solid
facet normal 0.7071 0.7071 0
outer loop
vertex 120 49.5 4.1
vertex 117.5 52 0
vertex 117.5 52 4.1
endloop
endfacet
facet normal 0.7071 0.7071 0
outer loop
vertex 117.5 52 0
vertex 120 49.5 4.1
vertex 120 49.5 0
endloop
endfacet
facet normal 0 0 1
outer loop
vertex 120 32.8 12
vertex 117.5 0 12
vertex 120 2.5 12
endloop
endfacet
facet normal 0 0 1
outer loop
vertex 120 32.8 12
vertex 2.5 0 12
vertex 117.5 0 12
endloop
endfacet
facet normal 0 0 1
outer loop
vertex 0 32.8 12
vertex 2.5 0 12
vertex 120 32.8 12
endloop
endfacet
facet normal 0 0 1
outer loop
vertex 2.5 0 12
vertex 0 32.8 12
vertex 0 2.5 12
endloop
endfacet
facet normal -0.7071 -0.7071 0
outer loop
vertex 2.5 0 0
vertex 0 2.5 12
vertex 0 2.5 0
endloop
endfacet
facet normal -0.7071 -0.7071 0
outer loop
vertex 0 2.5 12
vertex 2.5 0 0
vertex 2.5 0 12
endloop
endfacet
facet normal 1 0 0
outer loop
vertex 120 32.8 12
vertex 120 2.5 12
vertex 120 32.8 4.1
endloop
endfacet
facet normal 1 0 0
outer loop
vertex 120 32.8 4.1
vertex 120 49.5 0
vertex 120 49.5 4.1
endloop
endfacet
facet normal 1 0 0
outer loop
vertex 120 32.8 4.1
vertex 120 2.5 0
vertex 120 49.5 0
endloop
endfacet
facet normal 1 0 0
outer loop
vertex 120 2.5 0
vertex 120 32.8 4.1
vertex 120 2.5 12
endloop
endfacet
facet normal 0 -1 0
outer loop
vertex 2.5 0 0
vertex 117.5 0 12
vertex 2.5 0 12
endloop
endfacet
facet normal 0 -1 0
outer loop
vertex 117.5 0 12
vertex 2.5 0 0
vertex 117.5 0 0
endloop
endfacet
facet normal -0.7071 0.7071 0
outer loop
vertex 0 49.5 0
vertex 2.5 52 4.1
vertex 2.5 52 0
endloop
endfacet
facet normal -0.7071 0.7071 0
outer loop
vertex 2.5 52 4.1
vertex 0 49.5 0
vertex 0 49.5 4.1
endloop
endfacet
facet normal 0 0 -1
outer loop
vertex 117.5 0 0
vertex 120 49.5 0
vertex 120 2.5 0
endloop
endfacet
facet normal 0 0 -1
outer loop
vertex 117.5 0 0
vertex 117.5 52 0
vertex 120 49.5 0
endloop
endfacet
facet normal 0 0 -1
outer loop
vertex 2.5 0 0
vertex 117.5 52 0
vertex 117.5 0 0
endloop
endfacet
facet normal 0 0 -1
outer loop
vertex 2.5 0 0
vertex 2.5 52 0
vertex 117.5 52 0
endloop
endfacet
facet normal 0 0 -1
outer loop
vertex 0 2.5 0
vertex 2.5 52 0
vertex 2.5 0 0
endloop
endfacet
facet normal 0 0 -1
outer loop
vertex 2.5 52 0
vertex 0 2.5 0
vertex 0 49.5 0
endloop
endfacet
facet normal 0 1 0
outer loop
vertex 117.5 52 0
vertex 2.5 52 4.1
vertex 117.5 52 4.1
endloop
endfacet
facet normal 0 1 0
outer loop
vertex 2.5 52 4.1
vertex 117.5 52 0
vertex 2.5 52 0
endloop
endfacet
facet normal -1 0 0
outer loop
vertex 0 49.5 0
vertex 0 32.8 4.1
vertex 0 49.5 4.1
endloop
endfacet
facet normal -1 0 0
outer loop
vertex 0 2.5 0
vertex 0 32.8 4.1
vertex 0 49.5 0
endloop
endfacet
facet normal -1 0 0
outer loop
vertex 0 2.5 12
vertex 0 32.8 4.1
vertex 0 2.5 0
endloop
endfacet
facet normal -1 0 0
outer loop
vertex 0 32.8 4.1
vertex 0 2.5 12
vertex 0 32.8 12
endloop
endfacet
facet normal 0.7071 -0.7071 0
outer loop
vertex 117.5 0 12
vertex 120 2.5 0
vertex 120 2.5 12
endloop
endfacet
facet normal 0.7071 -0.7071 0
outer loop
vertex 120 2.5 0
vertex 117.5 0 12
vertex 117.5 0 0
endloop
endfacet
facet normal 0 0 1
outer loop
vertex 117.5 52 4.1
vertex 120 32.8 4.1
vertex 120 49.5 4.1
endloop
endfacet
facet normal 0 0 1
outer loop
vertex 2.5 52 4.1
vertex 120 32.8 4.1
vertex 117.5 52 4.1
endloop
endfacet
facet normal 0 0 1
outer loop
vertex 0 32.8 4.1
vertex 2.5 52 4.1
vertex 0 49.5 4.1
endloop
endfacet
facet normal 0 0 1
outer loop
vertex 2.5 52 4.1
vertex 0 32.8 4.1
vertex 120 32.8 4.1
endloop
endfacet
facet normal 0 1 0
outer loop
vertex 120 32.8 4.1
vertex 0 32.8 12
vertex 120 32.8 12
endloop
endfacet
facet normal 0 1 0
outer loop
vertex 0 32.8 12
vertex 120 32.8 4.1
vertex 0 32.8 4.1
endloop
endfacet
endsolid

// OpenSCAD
$fn = 32;

// ----------------------------------------------------------------------
// Stepped bar: sidestep, 120 x 52 x 12/4.1 mm
// ----------------------------------------------------------------------

// --- parameters (mm) ---
bar_l = 120;              // bar length, X
bar_w = 52;               // bar width, Y
plate_t = 12;             // thickness of the thick zone, Z
thin_t = 4.1;             // thickness of the thin zone
corner_c = 2.5;           // corner chamfer of the bar
step_cut = 7.9;           // material removed from the thin zone
ledge_y = 32.8;           // start of the ledge from the front edge
depth_1 = 7.9;            // depth of cut 1 from the top face
fit_tol = 0.05;           // declared fit tolerance (prompt contract)
free_tol = 0.3;           // declared free tolerance (prompt contract)

profile = [[2.5, 0], [117.5, 0], [120, 2.5], [120, 49.5], [117.5, 52], [2.5, 52], [0, 49.5], [0, 2.5]];  // primary outline, 8 points, counter clockwise
void_1 = [[-1, 32.8], [121, 32.8], [121, 53], [-1, 53]];  // ledge cut along one edge, 4 points

// --- the one profile operation ---
difference() {
  linear_extrude(height = plate_t) polygon(points = profile);
  translate([0, 0, plate_t - depth_1])
    linear_extrude(height = depth_1 + 1) polygon(points = void_1);
}
